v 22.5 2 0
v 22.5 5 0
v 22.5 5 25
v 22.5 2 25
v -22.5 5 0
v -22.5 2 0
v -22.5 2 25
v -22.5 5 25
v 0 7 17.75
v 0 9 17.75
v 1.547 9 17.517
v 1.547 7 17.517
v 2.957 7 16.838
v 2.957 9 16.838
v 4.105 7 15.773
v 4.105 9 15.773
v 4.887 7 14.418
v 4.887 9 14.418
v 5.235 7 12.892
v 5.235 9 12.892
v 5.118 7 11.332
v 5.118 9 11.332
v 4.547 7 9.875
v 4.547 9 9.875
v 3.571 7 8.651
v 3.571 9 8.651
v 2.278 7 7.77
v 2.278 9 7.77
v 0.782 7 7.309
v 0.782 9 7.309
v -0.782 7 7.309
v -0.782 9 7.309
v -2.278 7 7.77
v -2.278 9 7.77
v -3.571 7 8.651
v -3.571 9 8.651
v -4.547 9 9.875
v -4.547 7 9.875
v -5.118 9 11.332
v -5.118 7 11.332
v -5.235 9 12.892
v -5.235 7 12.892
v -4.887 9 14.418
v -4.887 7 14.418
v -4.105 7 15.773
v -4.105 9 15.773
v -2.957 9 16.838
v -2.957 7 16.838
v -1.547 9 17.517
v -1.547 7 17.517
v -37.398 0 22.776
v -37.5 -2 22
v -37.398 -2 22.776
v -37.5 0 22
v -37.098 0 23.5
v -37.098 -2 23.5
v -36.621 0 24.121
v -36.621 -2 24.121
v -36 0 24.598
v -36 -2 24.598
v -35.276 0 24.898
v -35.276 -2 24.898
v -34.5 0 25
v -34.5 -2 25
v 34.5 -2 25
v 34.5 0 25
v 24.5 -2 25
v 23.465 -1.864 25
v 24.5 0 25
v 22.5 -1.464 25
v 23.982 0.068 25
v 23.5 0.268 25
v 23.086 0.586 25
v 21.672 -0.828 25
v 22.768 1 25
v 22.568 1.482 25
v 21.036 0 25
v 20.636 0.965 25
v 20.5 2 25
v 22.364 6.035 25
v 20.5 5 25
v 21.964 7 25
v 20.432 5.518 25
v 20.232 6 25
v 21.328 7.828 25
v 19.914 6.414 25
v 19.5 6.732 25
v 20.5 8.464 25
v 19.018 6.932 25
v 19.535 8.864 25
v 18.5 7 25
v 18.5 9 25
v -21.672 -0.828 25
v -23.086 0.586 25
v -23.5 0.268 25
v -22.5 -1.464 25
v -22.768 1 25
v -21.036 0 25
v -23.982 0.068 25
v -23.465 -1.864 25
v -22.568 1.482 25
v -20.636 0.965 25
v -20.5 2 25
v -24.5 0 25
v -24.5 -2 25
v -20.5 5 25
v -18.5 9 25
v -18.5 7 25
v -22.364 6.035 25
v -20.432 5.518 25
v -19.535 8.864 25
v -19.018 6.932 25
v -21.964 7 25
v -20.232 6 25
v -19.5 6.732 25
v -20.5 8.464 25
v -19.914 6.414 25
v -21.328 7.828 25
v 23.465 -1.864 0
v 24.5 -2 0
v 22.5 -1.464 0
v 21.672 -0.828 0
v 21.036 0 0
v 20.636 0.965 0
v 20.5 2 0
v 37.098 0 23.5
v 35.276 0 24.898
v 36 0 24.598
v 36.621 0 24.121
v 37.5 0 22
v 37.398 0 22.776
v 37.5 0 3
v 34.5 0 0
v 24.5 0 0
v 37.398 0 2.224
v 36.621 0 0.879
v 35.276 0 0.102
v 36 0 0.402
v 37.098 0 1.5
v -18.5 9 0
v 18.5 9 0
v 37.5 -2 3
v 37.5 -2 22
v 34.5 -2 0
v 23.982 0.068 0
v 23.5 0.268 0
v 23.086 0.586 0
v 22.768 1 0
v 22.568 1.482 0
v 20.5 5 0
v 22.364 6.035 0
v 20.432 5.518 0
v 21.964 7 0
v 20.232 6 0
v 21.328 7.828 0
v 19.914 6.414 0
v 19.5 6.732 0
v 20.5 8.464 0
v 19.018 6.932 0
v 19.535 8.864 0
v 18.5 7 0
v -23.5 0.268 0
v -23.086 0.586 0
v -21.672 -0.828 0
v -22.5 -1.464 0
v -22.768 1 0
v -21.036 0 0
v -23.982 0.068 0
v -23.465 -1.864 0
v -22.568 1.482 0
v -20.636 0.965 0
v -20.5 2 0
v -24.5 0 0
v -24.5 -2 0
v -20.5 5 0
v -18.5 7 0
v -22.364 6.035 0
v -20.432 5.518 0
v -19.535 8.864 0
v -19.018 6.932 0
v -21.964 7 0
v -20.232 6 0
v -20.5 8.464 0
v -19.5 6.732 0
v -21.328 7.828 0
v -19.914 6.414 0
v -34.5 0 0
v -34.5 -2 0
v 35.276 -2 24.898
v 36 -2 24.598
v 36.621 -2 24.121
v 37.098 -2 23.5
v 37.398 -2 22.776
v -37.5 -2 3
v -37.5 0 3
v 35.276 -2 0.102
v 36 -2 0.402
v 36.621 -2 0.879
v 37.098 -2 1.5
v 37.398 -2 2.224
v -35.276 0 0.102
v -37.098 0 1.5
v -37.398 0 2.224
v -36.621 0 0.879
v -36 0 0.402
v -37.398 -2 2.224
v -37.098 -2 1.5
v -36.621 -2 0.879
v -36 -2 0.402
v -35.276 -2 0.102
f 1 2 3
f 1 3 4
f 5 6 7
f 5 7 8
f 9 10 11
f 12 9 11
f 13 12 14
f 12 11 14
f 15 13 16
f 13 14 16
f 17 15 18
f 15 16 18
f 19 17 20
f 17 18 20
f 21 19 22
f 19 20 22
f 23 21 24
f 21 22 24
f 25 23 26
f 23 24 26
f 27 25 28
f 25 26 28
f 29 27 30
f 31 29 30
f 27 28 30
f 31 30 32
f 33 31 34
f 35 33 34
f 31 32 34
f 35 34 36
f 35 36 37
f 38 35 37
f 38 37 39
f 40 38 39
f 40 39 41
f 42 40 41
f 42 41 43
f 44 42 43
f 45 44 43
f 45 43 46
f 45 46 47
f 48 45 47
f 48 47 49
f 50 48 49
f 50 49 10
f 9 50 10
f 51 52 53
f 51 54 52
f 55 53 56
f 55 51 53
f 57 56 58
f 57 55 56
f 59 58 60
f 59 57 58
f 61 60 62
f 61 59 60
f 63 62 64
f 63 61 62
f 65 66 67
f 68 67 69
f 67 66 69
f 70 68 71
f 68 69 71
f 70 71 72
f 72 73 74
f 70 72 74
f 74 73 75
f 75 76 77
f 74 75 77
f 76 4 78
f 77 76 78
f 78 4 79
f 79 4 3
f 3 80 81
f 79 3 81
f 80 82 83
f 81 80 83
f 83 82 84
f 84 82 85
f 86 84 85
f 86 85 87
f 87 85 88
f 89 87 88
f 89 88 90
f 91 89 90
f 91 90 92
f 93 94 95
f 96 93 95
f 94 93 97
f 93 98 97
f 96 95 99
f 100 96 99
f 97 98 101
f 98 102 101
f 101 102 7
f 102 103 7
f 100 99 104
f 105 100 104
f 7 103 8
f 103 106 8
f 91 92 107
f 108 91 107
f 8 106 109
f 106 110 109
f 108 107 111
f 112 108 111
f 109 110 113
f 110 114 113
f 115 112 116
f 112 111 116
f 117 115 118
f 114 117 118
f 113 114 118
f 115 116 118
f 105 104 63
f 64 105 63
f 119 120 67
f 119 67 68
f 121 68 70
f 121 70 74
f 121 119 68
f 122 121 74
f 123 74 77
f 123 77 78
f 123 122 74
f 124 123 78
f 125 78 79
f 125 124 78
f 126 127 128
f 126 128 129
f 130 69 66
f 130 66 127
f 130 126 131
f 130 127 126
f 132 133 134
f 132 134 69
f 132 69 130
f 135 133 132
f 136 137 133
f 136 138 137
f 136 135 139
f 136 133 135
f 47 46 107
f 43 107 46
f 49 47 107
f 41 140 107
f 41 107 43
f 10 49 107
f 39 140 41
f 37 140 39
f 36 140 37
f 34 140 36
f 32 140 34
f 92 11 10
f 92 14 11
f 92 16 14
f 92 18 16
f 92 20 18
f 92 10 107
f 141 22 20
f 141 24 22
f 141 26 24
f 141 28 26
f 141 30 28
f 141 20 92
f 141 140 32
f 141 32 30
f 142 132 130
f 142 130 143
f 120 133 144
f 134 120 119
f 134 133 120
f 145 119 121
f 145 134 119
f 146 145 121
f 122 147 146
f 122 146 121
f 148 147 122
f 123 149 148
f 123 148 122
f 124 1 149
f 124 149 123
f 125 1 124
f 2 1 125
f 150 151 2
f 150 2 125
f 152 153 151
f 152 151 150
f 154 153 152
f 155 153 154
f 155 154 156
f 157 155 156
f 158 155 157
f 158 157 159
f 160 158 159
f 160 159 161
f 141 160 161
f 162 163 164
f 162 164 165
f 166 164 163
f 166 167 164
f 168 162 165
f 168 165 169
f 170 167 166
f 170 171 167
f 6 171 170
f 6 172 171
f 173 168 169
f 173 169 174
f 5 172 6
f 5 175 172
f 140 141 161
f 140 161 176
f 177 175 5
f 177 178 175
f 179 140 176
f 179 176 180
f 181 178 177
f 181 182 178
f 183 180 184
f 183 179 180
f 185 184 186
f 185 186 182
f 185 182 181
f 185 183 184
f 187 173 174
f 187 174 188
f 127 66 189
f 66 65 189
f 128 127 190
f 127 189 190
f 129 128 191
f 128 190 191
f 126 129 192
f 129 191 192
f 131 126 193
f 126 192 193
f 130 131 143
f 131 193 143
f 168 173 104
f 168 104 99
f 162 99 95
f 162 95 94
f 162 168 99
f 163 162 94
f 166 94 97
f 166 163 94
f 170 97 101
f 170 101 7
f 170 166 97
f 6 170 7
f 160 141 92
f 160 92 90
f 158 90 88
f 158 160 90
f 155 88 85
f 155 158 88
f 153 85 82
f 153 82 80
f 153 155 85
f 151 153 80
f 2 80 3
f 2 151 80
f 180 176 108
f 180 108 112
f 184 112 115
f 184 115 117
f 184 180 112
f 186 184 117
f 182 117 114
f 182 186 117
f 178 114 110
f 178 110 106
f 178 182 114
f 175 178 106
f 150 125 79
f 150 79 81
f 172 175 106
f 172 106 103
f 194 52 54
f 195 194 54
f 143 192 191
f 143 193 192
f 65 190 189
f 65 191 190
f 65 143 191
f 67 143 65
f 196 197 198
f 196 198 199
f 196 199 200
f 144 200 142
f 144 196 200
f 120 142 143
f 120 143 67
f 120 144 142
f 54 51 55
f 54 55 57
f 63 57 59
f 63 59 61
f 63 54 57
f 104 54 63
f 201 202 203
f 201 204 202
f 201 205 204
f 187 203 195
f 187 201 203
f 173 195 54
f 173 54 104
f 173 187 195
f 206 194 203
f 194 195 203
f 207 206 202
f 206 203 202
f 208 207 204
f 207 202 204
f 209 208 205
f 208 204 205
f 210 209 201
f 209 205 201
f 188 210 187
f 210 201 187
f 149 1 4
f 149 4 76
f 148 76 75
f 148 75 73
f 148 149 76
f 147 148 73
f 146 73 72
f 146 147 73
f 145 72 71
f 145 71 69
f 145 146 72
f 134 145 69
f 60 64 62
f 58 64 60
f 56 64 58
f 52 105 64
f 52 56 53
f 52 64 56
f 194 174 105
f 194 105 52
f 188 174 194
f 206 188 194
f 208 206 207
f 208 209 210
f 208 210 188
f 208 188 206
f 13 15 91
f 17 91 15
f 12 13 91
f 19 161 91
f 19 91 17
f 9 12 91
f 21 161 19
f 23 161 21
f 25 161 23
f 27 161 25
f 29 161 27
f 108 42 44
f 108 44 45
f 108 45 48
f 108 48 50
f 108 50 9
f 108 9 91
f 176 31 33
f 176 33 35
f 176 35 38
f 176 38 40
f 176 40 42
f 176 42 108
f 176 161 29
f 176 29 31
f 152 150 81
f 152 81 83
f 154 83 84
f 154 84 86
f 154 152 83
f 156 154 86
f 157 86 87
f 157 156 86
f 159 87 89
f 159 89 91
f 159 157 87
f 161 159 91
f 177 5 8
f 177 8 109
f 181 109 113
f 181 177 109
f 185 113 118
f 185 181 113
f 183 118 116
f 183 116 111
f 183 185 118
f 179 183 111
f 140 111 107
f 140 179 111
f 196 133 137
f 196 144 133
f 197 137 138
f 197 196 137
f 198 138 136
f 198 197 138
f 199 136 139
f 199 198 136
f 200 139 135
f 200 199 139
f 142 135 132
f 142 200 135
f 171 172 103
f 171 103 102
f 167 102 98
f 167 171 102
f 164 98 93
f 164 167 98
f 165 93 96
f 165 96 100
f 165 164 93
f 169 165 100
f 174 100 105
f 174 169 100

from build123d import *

# Parameters (mm, degrees)
BASE_FLANGE1_DEPTH = 25
SKETCH7_R          = 5.25
CUT_EXTRUDE1_DEPTH = 10
FILLET1_R          = 3


# Sheet-metal steps are written as plain solids
with BuildPart() as part:
    # Sketch1 → Base-Flange1 (new body)
    with BuildSketch(Plane.XY):
        with BuildLine():
            Line((-37.5, 0), (-24.5, 0))
            ThreePointArc((-24.5, 0), (-23.085786438, 0.585786438), (-22.5, 2))
            Line((-22.5, 2), (-22.5, 5))
            ThreePointArc((-22.5, 5), (-21.328427125, 7.828427125), (-18.5, 9))
            Line((-18.5, 9), (18.5, 9))
            ThreePointArc((18.5, 9), (21.328427125, 7.828427125), (22.5, 5))
            Line((22.5, 5), (22.5, 2))
            ThreePointArc((22.5, 2), (23.085786438, 0.585786438), (24.5, 0))
            Line((24.5, 0), (37.5, 0))
            Line((37.5, 0), (37.5, -2))
            Line((37.5, -2), (24.5, -2))
            ThreePointArc((24.5, -2), (21.671572875, -0.828427125), (20.5, 2))
            Line((20.5, 2), (20.5, 5))
            ThreePointArc((20.5, 5), (19.914213562, 6.414213562), (18.5, 7))
            Line((18.5, 7), (-18.5, 7))
            ThreePointArc((-18.5, 7), (-19.914213562, 6.414213562), (-20.5, 5))
            Line((-20.5, 5), (-20.5, 2))
            ThreePointArc((-20.5, 2), (-21.671572875, -0.828427125), (-24.5, -2))
            Line((-24.5, -2), (-37.5, -2))
            Line((-37.5, -2), (-37.5, 0))
        make_face()
    extrude(amount=BASE_FLANGE1_DEPTH)

    # Sketch7 → Cut-Extrude1 (cut)
    with BuildSketch(Plane(origin=(0, 9, 0), x_dir=(1, 0, 0), z_dir=(0, 1, 0))):
        with Locations(Location((0, -12.5, 0), (0, 0, 270))):
            Circle(SKETCH7_R)
    extrude(amount=-CUT_EXTRUDE1_DEPTH, mode=Mode.SUBTRACT)

    # Fillet1
    fillet1_edges = [part.edges().sort_by_distance(p)[0] for p in [
        (-37.5, -1, 0),
        (37.5, -1, 0),
        (-37.5, -1, 25),
        (37.5, -1, 25),
    ]]
    fillet(fillet1_edges, radius=FILLET1_R)


solid = part.part
